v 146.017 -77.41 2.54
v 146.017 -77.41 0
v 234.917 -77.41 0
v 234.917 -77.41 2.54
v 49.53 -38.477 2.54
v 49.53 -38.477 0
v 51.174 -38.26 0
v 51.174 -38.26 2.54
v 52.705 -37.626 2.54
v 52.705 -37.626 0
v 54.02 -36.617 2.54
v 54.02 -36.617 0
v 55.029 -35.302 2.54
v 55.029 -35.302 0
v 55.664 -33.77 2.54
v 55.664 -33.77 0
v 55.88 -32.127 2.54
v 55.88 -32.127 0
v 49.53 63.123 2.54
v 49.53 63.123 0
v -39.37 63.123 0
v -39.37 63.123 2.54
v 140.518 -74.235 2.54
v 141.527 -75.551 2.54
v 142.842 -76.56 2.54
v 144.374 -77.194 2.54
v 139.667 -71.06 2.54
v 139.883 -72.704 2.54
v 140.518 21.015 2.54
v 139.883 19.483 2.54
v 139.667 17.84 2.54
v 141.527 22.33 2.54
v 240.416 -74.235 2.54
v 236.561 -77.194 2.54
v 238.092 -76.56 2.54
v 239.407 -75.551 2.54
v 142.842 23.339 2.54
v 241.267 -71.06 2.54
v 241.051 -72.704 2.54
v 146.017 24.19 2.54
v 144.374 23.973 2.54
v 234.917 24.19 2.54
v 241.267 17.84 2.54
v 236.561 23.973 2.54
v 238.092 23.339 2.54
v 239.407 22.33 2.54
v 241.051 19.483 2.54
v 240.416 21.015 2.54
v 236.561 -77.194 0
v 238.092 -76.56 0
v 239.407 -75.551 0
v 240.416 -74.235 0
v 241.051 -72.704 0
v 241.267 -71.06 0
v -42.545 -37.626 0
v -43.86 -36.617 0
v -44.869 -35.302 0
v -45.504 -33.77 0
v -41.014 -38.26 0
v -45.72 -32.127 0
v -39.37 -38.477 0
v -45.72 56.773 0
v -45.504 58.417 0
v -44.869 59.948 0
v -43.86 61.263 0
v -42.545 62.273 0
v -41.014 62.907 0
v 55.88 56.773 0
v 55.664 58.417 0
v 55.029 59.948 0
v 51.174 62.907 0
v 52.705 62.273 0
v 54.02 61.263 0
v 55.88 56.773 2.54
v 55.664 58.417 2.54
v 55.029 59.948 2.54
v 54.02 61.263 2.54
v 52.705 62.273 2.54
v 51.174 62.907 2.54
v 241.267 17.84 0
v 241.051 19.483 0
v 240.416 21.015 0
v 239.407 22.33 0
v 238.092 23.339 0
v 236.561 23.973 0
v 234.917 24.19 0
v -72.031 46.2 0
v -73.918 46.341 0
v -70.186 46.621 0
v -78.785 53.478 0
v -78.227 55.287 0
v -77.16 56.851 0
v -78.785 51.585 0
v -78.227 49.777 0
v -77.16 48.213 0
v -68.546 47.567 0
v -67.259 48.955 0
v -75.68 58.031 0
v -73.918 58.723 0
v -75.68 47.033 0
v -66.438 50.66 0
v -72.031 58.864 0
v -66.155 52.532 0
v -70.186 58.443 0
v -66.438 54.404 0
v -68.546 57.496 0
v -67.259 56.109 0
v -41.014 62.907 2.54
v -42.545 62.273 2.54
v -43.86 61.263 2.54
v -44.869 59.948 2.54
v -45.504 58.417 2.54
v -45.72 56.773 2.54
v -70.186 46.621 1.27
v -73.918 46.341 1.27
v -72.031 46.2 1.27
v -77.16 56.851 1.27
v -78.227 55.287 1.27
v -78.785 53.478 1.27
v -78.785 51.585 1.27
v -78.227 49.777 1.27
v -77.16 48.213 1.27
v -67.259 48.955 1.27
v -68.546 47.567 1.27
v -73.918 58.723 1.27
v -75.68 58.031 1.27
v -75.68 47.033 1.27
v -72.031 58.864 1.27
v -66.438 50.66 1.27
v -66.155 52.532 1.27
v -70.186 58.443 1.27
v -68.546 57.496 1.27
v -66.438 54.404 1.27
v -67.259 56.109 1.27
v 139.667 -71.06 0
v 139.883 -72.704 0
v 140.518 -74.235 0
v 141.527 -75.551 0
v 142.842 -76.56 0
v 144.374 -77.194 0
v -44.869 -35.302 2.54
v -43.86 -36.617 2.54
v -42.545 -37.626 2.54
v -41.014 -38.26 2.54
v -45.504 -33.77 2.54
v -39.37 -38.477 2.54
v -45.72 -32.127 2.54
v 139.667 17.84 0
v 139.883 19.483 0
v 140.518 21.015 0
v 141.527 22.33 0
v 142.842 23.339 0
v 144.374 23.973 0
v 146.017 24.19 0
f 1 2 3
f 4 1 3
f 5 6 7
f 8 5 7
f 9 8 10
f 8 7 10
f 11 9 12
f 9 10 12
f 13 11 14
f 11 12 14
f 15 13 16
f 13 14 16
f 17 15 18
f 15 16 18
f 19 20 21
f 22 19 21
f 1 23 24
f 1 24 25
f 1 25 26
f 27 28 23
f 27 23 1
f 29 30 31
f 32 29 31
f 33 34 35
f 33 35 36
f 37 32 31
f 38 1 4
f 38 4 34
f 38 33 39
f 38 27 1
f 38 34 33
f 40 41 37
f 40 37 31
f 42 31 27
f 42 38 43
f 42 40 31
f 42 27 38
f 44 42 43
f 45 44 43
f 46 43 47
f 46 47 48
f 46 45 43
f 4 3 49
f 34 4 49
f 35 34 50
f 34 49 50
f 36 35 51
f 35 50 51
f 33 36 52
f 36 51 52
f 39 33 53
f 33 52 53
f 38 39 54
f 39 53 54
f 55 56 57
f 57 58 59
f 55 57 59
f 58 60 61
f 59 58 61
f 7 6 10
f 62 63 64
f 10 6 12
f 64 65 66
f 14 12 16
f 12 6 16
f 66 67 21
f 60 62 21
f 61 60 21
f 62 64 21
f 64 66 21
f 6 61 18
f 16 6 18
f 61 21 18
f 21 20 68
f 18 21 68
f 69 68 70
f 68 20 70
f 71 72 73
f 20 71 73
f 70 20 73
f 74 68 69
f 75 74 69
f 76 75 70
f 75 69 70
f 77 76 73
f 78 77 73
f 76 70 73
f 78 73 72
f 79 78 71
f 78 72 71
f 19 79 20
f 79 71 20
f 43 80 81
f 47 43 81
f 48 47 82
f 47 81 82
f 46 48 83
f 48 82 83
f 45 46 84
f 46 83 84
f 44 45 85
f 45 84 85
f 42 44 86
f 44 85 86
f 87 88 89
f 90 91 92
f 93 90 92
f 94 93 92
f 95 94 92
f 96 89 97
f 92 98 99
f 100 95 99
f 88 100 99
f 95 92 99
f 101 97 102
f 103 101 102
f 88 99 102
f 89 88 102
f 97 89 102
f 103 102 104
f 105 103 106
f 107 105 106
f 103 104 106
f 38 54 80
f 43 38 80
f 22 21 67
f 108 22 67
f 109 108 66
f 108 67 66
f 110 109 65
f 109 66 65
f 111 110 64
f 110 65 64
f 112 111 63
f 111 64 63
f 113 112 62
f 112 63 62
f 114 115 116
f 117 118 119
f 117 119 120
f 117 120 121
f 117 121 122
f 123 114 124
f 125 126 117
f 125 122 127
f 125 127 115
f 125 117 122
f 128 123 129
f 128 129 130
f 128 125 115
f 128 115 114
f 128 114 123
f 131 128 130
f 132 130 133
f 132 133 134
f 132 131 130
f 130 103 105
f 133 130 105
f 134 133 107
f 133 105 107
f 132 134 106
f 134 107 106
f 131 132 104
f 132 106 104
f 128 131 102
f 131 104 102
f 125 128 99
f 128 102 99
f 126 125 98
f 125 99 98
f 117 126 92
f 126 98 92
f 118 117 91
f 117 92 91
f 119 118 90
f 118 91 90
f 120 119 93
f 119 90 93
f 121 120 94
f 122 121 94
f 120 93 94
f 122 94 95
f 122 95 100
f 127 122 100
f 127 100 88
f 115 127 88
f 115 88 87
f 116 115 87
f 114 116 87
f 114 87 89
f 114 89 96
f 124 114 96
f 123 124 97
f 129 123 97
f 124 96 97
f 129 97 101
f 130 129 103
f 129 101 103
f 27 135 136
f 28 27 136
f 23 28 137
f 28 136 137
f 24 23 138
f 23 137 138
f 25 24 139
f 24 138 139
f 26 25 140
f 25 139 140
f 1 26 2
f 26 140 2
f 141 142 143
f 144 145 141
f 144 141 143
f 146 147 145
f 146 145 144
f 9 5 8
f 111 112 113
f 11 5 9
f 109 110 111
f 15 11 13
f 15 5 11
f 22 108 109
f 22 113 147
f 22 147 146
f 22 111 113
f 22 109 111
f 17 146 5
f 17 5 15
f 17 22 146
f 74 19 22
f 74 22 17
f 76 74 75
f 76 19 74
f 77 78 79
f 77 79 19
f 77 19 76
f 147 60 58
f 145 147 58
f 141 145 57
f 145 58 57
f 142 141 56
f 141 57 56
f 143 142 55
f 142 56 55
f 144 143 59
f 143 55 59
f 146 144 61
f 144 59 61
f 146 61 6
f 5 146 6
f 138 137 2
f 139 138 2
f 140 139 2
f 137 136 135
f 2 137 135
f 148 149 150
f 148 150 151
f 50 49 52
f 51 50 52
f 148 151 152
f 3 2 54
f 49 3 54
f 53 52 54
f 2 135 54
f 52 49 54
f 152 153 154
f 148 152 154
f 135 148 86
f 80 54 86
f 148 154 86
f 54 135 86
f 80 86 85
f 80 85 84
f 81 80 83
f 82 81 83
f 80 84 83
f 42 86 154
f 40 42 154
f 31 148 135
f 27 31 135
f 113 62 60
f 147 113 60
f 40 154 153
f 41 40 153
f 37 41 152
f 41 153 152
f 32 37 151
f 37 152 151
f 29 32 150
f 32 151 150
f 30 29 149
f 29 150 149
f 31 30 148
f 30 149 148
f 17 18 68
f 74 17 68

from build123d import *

# Parameters (mm, degrees)
F1_DEPTH = 2.54
F2_R     = 6.35
F3_DEPTH = 1.27
F5_DEPTH = 2.54


with BuildPart() as f1:
    # F0 (on Top) → F1 (new body)
    with BuildSketch(Plane.XY):
        with BuildLine():
            ThreePointArc((-45.72, -32.126745), (-43.860128, -36.616873), (-39.37, -38.476745))
            Line((-39.37, -38.476745), (49.53, -38.476745))
            ThreePointArc((49.53, -38.476745), (54.020128, -36.616873), (55.88, -32.126745))
            Line((55.88, -32.126745), (55.88, 56.773255))
            ThreePointArc((55.88, 56.773255), (54.020128, 61.263383), (49.53, 63.123255))
            Line((49.53, 63.123255), (-39.37, 63.123255))
            ThreePointArc((-39.37, 63.123255), (-43.860128, 61.263383), (-45.72, 56.773255))
            Line((-45.72, 56.773255), (-45.72, -32.126745))
        make_face()
    extrude(amount=F1_DEPTH)


with BuildPart() as f3:
    # F2 (on Top) → F3 (new body)
    with BuildSketch(Plane.XY):
        with Locations((-72.505452, 52.53182)):
            Circle(F2_R)
    extrude(amount=F3_DEPTH)


with BuildPart() as f5:
    # F4 (on Top) → F5 (new body)
    with BuildSketch(Plane.XY):
        with BuildLine():
            Line((234.91706, 24.189552), (146.01706, 24.189552))
            ThreePointArc((146.01706, 24.189552), (141.526932, 22.32968), (139.66706, 17.839552))
            Line((139.66706, 17.839552), (139.66706, -71.060448))
            ThreePointArc((139.66706, -71.060448), (141.526932, -75.550576), (146.01706, -77.410448))
            Line((146.01706, -77.410448), (234.91706, -77.410448))
            ThreePointArc((234.91706, -77.410448), (239.407188, -75.550576), (241.26706, -71.060448))
            Line((241.26706, -71.060448), (241.26706, 17.839552))
            ThreePointArc((241.26706, 17.839552), (239.407188, 22.32968), (234.91706, 24.189552))
        make_face()
    extrude(amount=F5_DEPTH)


solid = Compound([f1.part, f3.part, f5.part])
